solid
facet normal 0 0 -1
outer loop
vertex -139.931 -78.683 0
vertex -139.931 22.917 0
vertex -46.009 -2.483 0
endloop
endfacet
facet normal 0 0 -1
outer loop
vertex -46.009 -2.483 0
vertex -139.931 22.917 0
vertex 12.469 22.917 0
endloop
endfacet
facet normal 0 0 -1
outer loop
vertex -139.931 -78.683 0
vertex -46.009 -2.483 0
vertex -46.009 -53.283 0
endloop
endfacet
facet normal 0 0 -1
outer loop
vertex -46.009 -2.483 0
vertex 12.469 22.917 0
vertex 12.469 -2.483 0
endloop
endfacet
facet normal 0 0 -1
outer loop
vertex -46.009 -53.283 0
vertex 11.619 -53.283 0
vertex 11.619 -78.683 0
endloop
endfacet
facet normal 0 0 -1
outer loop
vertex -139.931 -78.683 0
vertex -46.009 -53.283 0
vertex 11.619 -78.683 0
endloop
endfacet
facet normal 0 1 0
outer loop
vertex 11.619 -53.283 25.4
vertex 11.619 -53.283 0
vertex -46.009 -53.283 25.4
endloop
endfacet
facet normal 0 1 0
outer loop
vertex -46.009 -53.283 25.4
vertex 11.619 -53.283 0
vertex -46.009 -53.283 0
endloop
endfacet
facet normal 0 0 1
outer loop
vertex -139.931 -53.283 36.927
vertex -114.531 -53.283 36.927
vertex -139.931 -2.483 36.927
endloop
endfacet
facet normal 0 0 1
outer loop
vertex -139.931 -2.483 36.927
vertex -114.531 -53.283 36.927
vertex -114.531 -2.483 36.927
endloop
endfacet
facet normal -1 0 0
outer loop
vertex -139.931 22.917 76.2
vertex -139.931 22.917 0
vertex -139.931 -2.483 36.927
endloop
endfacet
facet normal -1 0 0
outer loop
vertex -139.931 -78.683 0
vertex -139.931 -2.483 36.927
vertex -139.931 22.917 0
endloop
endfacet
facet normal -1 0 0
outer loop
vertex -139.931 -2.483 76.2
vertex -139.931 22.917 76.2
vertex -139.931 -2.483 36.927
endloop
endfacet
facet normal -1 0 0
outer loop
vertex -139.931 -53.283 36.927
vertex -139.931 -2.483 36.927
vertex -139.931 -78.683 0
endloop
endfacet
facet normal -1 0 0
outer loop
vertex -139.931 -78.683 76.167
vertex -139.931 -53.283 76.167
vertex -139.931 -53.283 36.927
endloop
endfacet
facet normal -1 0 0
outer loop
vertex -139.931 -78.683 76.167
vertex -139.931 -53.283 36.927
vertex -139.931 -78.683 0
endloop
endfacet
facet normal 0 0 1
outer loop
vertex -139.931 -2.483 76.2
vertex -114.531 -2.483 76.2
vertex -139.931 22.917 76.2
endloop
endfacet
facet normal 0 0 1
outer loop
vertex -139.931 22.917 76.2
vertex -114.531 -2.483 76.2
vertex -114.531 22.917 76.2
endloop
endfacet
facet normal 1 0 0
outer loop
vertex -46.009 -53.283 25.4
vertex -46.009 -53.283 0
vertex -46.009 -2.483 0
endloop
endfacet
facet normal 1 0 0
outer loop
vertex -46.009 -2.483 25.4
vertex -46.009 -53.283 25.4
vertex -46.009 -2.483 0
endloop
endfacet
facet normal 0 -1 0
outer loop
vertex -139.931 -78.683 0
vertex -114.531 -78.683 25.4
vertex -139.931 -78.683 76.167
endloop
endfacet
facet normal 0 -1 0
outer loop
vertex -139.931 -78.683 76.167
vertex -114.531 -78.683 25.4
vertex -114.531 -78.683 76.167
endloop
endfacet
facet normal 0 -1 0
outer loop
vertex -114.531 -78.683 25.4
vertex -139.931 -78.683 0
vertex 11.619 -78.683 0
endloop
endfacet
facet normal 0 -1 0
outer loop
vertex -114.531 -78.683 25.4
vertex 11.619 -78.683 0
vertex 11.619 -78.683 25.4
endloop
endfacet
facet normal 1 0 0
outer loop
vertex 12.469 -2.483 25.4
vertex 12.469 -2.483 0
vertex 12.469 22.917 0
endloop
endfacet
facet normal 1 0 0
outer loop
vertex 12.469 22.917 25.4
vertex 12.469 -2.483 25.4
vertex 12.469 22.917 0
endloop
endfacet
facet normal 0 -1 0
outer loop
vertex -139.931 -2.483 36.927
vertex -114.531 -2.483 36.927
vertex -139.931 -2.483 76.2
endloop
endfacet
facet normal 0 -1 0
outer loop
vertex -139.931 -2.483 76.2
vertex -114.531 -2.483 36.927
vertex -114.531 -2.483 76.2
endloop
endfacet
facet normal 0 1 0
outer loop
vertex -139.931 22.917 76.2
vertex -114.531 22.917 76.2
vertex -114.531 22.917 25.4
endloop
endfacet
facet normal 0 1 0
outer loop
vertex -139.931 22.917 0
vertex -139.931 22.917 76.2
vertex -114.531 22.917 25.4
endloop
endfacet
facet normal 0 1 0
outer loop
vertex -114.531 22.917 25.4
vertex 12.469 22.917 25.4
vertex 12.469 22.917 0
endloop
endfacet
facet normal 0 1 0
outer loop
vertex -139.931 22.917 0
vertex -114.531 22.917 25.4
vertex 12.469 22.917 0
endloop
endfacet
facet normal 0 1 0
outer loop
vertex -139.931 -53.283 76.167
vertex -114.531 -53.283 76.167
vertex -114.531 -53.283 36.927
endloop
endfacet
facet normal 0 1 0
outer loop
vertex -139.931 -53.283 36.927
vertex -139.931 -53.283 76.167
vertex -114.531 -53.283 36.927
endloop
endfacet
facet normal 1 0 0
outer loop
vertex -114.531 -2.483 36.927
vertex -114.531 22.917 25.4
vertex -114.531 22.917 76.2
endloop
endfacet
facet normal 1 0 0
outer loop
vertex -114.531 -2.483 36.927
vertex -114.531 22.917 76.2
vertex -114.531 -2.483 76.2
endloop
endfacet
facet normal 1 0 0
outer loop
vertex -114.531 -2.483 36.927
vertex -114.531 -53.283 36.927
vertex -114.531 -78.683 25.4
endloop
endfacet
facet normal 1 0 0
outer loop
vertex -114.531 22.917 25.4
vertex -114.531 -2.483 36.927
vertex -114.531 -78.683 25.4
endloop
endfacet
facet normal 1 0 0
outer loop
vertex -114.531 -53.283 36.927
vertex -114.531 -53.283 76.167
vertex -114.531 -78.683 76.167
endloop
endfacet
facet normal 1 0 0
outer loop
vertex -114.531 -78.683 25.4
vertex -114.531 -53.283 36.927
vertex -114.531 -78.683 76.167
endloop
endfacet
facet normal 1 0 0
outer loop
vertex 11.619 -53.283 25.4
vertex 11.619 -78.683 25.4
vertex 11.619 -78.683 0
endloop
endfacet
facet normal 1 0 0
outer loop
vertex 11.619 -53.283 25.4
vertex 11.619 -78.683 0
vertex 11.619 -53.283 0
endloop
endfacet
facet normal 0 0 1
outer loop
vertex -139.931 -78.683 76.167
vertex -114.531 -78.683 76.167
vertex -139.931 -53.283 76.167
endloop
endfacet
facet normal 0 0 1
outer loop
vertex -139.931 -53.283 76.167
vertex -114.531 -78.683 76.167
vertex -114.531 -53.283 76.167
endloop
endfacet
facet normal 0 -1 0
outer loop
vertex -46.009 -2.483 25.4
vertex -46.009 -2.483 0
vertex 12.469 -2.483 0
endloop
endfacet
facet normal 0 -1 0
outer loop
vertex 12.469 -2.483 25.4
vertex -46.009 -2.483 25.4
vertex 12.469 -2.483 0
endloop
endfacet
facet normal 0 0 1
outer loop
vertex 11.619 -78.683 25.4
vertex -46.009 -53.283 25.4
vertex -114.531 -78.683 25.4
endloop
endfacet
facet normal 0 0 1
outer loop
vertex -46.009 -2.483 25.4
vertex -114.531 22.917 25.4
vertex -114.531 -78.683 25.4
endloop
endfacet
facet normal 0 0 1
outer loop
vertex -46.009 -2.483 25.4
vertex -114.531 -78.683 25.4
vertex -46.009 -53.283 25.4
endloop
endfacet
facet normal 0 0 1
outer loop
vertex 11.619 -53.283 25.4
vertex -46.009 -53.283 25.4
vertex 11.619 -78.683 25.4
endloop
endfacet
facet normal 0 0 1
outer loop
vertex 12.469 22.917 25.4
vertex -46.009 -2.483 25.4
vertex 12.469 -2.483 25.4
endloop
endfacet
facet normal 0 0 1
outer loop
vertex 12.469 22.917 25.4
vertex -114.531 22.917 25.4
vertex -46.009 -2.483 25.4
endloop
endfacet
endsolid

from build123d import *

# Parameters (mm, degrees)
F1_DEPTH = 25.4
F3_DEPTH = 25.4


with BuildPart() as f1:
    # F0 (on Top) → F1 (new body)
    with BuildSketch(Plane.XY):
        Polygon((12.468524, 22.91733), (-114.531476, 22.91733), (-114.531476, -78.68267), (11.619264, -78.68267), (11.619264, -53.28267), (-46.009442, -53.28267), (-46.009442, -2.48267), (12.468524, -2.48267), align=None)
    extrude(amount=F1_DEPTH)

    # F2 (on face) → F3 (join)
    with BuildSketch(Plane(origin=(-114.531476, 0, 0), x_dir=(0, -1, 0), z_dir=(-1, 0, 0))):
        Polygon((-22.91733, 76.2), (-22.91733, 0), (78.68267, 0), (78.68267, 76.166742), (53.28267, 76.166742), (53.28267, 36.926549), (2.48267, 36.926549), (2.48267, 76.2), align=None)
    extrude(amount=F3_DEPTH)


solid = f1.part
